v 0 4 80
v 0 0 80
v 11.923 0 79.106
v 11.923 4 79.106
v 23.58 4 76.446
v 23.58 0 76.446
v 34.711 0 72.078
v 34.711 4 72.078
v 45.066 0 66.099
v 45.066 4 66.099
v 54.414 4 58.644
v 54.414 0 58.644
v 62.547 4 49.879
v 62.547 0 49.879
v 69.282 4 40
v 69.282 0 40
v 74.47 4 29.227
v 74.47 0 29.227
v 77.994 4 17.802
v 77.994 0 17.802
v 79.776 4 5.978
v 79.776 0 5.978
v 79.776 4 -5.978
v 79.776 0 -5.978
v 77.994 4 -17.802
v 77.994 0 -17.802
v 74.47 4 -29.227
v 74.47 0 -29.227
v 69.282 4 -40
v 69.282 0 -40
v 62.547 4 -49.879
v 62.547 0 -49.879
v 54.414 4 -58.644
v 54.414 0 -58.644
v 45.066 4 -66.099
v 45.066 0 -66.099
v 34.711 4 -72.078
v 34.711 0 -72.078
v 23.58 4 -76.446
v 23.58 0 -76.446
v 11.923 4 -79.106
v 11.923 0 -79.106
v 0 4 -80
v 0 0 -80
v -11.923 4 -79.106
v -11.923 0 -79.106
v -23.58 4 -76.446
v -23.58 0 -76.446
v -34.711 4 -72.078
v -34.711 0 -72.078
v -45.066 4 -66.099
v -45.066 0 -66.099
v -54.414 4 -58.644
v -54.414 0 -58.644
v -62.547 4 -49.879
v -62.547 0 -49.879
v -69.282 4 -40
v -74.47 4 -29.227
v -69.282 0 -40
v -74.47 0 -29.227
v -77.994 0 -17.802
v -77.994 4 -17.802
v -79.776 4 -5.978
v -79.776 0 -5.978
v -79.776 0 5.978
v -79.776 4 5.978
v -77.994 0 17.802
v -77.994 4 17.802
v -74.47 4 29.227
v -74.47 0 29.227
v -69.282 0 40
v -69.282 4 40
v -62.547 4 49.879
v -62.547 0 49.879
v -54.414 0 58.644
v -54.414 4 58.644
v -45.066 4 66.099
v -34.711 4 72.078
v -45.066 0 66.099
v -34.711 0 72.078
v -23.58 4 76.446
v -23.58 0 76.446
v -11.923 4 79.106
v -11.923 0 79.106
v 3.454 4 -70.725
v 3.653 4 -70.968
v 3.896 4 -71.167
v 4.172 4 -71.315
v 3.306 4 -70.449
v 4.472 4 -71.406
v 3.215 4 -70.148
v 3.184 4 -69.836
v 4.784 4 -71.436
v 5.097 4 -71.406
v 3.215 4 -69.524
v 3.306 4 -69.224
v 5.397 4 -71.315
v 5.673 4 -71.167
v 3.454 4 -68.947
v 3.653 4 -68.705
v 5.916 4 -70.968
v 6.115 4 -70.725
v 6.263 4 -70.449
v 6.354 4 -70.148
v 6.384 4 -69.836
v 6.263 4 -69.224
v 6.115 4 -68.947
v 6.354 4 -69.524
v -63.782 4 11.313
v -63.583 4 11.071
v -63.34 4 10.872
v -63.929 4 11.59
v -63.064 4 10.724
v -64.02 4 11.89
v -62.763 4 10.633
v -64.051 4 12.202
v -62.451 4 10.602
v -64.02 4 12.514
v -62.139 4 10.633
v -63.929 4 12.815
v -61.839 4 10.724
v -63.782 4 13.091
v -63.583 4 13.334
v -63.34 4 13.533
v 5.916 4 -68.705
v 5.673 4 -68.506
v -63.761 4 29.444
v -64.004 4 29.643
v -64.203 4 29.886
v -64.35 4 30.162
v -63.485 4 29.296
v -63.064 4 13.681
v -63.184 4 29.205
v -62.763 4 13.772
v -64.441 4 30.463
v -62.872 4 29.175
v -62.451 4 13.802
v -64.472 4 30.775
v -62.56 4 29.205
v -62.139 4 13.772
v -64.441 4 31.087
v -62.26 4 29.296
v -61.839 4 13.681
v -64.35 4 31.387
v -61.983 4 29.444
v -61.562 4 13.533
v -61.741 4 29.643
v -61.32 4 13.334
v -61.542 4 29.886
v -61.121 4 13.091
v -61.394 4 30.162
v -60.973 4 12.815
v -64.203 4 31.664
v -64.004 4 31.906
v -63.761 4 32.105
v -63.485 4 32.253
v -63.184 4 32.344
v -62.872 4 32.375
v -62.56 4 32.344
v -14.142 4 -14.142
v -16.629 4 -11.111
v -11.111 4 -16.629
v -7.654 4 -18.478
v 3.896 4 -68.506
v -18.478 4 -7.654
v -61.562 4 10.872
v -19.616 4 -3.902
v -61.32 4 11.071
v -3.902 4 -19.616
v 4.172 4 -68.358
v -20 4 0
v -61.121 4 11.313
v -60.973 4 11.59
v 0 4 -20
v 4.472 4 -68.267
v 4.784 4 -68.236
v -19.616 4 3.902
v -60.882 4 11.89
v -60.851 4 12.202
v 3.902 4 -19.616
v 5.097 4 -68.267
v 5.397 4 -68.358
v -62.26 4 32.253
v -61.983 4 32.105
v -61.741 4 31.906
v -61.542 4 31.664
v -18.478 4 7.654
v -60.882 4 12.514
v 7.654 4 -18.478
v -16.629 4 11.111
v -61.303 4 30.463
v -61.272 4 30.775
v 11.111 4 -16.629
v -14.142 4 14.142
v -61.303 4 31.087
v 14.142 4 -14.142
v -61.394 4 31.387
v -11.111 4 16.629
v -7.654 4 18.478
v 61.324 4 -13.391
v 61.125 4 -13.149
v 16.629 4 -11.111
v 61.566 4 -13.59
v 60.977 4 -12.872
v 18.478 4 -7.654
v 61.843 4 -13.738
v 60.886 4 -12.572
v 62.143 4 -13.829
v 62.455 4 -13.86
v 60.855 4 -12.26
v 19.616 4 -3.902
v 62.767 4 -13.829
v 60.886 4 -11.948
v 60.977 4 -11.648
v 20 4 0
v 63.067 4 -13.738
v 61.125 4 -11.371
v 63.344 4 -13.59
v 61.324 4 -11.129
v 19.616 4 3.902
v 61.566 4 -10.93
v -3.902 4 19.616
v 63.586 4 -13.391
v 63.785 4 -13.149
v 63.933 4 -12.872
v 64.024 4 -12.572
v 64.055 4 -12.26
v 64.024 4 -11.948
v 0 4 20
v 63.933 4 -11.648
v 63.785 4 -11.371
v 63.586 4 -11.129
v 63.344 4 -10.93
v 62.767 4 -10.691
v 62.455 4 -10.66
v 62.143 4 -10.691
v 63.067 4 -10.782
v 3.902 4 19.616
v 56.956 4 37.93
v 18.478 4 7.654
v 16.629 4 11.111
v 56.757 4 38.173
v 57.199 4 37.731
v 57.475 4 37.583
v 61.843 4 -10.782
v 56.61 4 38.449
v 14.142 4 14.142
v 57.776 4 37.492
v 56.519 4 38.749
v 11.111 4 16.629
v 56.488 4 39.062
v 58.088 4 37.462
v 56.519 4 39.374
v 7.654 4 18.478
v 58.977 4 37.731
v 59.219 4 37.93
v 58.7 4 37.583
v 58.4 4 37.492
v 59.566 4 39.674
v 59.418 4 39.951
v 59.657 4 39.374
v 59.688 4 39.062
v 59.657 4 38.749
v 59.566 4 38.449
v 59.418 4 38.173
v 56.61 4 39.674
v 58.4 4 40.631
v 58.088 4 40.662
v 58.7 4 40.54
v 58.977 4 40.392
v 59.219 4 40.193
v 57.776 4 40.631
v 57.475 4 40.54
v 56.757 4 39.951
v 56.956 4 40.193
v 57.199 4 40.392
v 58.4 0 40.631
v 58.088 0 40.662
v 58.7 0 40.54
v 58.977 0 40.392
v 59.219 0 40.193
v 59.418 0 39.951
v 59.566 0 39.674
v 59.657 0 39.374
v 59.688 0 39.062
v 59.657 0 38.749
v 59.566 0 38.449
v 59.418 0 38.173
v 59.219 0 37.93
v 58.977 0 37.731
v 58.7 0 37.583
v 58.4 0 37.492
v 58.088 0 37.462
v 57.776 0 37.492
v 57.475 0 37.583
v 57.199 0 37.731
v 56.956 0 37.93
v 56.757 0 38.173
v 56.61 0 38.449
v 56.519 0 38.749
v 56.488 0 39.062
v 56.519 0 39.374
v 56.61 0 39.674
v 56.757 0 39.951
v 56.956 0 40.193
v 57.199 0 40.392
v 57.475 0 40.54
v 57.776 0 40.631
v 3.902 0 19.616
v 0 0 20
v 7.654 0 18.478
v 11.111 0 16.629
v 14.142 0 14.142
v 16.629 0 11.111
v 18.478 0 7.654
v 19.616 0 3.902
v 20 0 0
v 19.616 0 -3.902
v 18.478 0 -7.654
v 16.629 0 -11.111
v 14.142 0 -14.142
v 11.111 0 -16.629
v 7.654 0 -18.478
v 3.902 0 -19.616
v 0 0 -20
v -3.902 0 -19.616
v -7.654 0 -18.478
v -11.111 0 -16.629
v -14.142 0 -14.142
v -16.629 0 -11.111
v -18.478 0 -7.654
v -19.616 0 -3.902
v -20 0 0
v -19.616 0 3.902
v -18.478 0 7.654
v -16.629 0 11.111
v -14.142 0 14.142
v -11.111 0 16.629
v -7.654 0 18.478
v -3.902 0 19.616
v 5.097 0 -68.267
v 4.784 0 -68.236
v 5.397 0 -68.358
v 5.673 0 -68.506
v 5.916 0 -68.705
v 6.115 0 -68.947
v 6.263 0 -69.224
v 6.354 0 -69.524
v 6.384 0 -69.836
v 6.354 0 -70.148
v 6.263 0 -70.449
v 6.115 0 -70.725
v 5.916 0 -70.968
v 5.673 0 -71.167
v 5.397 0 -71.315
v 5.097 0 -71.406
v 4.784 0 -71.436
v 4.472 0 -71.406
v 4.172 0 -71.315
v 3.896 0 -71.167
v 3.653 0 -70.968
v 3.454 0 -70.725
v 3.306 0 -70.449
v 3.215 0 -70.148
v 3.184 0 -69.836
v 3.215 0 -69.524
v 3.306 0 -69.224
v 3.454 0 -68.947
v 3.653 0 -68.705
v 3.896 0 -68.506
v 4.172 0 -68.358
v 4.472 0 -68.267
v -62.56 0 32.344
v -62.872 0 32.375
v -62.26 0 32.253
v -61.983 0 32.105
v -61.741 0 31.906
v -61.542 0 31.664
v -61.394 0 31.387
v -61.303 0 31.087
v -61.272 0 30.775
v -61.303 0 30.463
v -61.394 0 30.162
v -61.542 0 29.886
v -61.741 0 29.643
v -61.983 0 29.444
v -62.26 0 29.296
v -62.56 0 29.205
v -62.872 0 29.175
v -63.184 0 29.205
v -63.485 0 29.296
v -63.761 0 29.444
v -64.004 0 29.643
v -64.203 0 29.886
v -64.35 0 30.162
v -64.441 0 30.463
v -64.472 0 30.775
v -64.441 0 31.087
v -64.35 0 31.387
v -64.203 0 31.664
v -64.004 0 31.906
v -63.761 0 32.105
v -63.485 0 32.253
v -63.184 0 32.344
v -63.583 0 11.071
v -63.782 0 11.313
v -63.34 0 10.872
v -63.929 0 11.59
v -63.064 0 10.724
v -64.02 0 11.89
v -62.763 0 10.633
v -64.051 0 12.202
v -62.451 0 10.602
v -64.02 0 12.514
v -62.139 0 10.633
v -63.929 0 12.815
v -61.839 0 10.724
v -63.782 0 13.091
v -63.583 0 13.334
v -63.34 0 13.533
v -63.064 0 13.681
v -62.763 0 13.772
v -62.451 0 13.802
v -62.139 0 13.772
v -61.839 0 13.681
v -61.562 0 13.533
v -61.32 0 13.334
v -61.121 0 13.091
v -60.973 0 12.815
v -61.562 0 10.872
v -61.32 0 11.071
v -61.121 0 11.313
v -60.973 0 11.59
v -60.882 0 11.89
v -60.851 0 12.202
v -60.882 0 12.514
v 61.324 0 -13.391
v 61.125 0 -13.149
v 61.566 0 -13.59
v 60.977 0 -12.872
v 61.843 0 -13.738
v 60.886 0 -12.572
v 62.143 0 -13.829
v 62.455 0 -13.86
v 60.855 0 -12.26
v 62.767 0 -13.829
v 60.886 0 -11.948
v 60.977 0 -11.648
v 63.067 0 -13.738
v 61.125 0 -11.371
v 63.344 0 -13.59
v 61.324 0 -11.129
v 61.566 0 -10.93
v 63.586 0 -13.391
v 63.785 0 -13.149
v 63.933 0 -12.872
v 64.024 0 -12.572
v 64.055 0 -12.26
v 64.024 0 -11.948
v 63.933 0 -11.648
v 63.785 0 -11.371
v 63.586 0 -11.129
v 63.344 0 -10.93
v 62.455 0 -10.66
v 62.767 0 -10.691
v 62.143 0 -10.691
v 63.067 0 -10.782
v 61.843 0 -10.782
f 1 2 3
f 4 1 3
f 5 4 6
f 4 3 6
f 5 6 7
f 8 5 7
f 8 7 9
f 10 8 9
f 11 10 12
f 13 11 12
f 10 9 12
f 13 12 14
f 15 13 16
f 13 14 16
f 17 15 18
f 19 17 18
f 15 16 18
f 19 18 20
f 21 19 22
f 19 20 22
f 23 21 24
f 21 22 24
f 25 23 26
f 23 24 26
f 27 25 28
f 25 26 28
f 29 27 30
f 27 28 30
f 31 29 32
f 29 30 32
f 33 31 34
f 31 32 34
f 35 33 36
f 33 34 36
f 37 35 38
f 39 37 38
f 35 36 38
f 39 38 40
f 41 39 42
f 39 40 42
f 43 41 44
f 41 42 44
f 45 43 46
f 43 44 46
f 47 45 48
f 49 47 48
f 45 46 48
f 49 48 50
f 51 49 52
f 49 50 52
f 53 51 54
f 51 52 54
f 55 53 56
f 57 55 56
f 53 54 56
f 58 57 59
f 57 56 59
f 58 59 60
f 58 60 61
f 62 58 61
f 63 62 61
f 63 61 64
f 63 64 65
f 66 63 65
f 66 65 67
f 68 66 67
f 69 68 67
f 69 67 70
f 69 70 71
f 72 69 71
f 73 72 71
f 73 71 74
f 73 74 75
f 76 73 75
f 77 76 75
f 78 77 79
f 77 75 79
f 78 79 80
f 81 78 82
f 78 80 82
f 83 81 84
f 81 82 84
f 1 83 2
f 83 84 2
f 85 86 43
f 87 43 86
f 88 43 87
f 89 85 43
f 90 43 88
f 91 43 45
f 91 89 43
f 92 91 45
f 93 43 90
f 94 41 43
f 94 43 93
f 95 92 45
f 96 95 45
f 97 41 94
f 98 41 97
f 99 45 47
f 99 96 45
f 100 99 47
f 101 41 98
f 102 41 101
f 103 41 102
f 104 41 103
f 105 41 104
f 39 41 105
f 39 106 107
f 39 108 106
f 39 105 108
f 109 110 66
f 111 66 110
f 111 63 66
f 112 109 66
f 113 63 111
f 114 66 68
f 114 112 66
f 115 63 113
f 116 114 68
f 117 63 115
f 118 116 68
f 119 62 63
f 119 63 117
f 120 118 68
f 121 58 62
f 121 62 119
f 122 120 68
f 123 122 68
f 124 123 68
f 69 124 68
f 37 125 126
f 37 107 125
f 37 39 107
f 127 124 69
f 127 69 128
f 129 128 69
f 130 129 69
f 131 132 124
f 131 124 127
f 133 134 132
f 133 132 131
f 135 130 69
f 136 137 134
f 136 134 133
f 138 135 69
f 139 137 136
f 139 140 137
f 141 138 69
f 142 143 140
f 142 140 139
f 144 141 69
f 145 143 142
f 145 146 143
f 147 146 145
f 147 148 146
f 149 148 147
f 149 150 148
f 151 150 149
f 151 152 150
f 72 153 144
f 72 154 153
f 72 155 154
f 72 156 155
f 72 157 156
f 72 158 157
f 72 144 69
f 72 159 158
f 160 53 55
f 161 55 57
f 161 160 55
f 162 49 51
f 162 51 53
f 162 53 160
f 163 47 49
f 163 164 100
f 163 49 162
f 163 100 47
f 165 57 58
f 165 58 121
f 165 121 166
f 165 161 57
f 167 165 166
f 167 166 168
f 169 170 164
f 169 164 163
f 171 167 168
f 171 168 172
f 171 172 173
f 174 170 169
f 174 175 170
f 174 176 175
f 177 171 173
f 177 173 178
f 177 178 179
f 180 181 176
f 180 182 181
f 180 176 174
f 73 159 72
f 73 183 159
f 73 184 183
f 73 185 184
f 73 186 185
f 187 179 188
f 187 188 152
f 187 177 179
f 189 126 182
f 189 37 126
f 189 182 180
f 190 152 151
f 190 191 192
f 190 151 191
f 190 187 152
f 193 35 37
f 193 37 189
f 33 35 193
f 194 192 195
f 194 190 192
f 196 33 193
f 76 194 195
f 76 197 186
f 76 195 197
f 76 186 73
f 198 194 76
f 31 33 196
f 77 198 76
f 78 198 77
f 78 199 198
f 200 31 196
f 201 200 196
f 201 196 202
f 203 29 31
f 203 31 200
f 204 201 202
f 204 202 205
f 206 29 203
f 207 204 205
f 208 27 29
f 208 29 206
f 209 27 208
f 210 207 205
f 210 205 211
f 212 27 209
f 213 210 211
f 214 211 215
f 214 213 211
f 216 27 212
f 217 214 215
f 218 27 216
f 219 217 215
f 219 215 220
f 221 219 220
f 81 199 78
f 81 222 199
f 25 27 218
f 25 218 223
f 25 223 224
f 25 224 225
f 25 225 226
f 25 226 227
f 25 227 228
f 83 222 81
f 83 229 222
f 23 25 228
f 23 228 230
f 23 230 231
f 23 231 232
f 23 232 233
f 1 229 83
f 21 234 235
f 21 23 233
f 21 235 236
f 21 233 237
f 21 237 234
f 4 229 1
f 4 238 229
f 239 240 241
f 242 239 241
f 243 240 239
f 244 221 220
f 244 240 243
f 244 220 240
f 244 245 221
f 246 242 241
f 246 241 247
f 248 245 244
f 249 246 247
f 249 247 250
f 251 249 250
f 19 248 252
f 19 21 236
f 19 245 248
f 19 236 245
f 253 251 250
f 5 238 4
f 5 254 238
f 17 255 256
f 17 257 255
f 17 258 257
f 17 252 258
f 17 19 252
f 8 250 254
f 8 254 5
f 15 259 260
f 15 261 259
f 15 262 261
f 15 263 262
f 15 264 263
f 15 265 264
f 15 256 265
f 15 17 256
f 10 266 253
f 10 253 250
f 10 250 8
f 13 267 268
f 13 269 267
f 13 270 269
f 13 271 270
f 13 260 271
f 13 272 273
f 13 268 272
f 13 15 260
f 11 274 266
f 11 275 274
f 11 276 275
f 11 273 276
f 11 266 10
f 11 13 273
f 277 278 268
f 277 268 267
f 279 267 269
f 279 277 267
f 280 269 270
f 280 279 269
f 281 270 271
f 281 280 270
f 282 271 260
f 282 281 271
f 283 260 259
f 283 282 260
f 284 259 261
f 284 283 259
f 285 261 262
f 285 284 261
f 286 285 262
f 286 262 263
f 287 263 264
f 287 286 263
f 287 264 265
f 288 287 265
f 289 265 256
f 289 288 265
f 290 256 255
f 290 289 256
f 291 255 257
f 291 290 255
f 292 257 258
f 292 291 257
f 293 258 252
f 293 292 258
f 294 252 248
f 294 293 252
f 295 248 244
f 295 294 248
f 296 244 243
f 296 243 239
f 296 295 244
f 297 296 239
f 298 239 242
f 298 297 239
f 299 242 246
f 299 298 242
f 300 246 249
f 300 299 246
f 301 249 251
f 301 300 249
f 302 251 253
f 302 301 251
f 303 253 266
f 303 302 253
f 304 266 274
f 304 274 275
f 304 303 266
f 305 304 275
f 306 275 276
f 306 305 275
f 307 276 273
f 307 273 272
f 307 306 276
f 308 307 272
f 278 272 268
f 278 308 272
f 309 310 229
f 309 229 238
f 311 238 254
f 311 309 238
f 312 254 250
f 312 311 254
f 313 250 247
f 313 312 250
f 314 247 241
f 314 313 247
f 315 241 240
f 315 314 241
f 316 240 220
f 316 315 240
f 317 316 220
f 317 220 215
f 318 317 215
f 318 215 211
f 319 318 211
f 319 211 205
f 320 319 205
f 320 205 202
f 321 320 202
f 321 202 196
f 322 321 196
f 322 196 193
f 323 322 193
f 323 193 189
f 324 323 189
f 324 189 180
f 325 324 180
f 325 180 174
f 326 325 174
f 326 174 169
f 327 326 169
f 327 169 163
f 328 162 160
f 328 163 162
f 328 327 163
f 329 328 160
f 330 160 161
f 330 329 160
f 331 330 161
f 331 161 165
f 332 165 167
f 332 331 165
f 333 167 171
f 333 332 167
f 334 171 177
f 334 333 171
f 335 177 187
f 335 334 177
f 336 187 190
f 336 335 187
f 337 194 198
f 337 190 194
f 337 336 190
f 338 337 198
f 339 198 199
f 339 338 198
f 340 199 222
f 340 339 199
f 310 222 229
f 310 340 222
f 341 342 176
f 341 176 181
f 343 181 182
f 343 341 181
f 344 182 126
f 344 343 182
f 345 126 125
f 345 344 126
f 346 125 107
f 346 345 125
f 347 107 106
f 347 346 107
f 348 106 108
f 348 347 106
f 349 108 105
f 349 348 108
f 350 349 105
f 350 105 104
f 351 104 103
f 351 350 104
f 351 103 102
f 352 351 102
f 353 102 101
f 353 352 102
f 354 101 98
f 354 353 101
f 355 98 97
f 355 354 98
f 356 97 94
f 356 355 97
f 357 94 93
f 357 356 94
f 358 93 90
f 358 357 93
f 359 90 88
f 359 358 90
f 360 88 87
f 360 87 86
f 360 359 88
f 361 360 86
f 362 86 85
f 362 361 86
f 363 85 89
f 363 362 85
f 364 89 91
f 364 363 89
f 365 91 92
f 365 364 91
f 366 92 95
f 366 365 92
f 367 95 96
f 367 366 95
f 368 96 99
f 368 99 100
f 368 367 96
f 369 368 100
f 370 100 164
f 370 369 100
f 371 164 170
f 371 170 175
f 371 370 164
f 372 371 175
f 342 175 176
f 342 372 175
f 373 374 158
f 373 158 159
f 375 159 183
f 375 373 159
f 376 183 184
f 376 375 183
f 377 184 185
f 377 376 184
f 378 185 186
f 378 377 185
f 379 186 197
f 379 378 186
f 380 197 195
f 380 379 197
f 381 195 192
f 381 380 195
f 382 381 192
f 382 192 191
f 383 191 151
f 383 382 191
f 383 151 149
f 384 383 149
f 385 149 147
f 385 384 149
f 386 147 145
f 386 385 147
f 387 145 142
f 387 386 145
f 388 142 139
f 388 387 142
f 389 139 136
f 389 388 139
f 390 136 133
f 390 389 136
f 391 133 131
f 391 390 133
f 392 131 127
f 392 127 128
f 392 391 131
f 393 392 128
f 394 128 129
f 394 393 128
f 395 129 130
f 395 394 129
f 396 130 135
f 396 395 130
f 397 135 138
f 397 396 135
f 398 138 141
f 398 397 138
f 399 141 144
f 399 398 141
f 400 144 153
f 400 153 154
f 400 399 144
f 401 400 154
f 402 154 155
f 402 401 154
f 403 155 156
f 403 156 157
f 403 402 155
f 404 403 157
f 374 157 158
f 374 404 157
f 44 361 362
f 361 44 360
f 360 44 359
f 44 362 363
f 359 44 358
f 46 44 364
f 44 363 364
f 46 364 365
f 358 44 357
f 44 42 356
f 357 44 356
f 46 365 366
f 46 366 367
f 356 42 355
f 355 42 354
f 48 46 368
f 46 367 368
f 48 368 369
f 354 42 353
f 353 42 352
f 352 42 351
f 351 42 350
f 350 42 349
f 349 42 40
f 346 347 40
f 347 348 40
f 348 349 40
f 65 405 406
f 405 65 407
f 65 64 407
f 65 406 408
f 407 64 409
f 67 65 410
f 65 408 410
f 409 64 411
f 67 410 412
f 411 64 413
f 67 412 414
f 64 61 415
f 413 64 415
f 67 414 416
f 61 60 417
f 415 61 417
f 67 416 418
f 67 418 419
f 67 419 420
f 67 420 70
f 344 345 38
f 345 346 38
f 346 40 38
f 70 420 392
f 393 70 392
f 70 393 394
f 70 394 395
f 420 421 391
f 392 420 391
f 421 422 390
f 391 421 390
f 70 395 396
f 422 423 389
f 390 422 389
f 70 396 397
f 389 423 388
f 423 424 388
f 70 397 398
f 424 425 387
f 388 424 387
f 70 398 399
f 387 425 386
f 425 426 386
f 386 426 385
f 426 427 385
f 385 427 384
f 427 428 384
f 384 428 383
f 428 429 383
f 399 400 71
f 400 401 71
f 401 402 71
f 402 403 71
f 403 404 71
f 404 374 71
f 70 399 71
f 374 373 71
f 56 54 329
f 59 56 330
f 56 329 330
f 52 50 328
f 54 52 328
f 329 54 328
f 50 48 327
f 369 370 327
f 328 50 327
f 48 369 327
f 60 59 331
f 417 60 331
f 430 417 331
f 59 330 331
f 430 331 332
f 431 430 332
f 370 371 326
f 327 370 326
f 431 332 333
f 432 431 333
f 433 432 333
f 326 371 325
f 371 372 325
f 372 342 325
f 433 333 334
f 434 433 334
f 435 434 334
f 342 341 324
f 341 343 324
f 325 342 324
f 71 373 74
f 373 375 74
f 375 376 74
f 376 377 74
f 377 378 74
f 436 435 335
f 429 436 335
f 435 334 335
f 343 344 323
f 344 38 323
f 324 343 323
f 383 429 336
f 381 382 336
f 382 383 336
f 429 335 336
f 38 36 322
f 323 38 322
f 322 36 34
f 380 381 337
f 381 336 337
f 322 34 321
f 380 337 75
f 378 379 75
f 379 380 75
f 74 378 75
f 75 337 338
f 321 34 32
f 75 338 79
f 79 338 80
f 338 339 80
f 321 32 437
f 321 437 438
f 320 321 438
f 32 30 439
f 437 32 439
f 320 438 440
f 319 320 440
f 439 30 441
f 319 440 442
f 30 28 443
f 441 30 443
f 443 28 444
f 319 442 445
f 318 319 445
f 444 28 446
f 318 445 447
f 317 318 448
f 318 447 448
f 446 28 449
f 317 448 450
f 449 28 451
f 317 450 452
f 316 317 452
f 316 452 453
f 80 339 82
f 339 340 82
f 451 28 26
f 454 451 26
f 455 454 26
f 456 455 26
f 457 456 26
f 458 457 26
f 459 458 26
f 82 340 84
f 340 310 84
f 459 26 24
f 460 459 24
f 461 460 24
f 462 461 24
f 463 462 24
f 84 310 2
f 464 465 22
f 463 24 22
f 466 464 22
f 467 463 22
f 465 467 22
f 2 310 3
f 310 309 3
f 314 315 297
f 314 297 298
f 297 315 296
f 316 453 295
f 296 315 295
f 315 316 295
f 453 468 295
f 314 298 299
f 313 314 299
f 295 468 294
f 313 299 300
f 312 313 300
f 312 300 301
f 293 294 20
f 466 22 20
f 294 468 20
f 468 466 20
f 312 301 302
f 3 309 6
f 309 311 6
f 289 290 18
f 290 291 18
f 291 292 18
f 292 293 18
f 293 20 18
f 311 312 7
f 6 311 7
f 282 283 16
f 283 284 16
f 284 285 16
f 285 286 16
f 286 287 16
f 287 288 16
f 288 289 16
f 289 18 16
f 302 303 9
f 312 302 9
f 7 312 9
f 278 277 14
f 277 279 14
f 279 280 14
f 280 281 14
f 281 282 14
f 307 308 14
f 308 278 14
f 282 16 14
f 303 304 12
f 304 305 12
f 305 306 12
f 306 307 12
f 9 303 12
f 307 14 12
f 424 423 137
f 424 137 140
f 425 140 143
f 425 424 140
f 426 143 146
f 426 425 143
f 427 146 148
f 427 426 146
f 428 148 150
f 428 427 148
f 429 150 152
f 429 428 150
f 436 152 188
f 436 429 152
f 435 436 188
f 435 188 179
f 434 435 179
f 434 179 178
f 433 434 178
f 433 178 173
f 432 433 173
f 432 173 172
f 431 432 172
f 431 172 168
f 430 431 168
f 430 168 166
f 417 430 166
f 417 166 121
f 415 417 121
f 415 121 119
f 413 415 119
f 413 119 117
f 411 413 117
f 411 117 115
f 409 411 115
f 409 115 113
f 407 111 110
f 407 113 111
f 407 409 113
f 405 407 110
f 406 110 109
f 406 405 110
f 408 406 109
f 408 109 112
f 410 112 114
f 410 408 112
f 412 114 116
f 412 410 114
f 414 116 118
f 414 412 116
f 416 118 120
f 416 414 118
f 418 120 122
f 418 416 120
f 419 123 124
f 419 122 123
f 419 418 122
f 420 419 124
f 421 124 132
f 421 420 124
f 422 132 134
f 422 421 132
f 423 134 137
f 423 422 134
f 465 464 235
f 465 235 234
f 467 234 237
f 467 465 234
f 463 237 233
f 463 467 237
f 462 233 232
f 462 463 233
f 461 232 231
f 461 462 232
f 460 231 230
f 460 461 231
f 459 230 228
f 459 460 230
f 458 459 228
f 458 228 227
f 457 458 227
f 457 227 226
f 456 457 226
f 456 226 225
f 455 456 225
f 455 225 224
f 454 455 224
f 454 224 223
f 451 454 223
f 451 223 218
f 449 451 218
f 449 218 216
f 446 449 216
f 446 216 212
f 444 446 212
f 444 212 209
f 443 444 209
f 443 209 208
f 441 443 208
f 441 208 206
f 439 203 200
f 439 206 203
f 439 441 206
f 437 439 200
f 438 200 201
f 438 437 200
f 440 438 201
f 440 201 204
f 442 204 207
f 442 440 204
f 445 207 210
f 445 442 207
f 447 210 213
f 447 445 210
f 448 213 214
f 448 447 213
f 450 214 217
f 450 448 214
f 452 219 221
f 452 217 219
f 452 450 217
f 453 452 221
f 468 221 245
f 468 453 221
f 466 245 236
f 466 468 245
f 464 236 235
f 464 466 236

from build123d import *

# Parameters (mm, degrees)
SKETCH_1_R               = 80
SKETCH_1_R_2             = 1.6
EXTRUDE_1_DEPTH          = 4
CUT_EXTRUDE_1_DEPTH      = 114.207773585
CUT_EXTRUDE_1_DEPTH_BACK = 114.207773585
SKETCH_2_R               = 1.6
CUT_EXTRUDE_2_DEPTH      = 114.207773585
CUT_EXTRUDE_2_DEPTH_BACK = 114.207773585
SKETCH_3_R               = 20


with BuildPart() as part:
    # 草图1 → 凸台-拉伸1 (new body)
    with BuildSketch(Plane(origin=(0, 0, 0), x_dir=(1, 0, 0), z_dir=(0, 1, 0))):
        with Locations(Location((0, 0, 0), (0, 0, 270))):
            Circle(SKETCH_1_R)
        with Locations(Location((4.784441198, 69.836302325, 0), (0, 0, 270))):
            Circle(SKETCH_1_R_2, mode=Mode.SUBTRACT)
        with Locations(Location((-62.872232519, -30.774703542, 0), (0, 0, 270))):
            Circle(SKETCH_1_R_2, mode=Mode.SUBTRACT)
        with Locations(Location((58.087791321, -39.061598783, 0), (0, 0, 270))):
            Circle(SKETCH_1_R_2, mode=Mode.SUBTRACT)
    extrude(amount=EXTRUDE_1_DEPTH)

    # 草图2 → 切除-拉伸1 (cut, two sides: drawn at the far end of the back side and taken through both)
    with BuildSketch(Plane(origin=(0, 4, 0), x_dir=(1, 0, 0), z_dir=(0, 1, 0)).offset(-CUT_EXTRUDE_1_DEPTH_BACK)):
        with Locations(Location((-62.451230924, -12.202314724, 0), (0, 0, 270))):
            Circle(SKETCH_2_R)
        with Locations(Location((62.455127781, 12.259932826, 0), (0, 0, 270))):
            Circle(SKETCH_2_R)
    extrude(amount=CUT_EXTRUDE_1_DEPTH + CUT_EXTRUDE_1_DEPTH_BACK, mode=Mode.SUBTRACT)

    # 草图3 → 切除-拉伸2 (cut, two sides: drawn at the far end of the back side and taken through both)
    with BuildSketch(Plane(origin=(0, 4, 0), x_dir=(1, 0, 0), z_dir=(0, 1, 0)).offset(-CUT_EXTRUDE_2_DEPTH_BACK)):
        with Locations(Location((0, 0, 0), (0, 0, 270))):
            Circle(SKETCH_3_R)
    extrude(amount=CUT_EXTRUDE_2_DEPTH + CUT_EXTRUDE_2_DEPTH_BACK, mode=Mode.SUBTRACT)


solid = part.part
